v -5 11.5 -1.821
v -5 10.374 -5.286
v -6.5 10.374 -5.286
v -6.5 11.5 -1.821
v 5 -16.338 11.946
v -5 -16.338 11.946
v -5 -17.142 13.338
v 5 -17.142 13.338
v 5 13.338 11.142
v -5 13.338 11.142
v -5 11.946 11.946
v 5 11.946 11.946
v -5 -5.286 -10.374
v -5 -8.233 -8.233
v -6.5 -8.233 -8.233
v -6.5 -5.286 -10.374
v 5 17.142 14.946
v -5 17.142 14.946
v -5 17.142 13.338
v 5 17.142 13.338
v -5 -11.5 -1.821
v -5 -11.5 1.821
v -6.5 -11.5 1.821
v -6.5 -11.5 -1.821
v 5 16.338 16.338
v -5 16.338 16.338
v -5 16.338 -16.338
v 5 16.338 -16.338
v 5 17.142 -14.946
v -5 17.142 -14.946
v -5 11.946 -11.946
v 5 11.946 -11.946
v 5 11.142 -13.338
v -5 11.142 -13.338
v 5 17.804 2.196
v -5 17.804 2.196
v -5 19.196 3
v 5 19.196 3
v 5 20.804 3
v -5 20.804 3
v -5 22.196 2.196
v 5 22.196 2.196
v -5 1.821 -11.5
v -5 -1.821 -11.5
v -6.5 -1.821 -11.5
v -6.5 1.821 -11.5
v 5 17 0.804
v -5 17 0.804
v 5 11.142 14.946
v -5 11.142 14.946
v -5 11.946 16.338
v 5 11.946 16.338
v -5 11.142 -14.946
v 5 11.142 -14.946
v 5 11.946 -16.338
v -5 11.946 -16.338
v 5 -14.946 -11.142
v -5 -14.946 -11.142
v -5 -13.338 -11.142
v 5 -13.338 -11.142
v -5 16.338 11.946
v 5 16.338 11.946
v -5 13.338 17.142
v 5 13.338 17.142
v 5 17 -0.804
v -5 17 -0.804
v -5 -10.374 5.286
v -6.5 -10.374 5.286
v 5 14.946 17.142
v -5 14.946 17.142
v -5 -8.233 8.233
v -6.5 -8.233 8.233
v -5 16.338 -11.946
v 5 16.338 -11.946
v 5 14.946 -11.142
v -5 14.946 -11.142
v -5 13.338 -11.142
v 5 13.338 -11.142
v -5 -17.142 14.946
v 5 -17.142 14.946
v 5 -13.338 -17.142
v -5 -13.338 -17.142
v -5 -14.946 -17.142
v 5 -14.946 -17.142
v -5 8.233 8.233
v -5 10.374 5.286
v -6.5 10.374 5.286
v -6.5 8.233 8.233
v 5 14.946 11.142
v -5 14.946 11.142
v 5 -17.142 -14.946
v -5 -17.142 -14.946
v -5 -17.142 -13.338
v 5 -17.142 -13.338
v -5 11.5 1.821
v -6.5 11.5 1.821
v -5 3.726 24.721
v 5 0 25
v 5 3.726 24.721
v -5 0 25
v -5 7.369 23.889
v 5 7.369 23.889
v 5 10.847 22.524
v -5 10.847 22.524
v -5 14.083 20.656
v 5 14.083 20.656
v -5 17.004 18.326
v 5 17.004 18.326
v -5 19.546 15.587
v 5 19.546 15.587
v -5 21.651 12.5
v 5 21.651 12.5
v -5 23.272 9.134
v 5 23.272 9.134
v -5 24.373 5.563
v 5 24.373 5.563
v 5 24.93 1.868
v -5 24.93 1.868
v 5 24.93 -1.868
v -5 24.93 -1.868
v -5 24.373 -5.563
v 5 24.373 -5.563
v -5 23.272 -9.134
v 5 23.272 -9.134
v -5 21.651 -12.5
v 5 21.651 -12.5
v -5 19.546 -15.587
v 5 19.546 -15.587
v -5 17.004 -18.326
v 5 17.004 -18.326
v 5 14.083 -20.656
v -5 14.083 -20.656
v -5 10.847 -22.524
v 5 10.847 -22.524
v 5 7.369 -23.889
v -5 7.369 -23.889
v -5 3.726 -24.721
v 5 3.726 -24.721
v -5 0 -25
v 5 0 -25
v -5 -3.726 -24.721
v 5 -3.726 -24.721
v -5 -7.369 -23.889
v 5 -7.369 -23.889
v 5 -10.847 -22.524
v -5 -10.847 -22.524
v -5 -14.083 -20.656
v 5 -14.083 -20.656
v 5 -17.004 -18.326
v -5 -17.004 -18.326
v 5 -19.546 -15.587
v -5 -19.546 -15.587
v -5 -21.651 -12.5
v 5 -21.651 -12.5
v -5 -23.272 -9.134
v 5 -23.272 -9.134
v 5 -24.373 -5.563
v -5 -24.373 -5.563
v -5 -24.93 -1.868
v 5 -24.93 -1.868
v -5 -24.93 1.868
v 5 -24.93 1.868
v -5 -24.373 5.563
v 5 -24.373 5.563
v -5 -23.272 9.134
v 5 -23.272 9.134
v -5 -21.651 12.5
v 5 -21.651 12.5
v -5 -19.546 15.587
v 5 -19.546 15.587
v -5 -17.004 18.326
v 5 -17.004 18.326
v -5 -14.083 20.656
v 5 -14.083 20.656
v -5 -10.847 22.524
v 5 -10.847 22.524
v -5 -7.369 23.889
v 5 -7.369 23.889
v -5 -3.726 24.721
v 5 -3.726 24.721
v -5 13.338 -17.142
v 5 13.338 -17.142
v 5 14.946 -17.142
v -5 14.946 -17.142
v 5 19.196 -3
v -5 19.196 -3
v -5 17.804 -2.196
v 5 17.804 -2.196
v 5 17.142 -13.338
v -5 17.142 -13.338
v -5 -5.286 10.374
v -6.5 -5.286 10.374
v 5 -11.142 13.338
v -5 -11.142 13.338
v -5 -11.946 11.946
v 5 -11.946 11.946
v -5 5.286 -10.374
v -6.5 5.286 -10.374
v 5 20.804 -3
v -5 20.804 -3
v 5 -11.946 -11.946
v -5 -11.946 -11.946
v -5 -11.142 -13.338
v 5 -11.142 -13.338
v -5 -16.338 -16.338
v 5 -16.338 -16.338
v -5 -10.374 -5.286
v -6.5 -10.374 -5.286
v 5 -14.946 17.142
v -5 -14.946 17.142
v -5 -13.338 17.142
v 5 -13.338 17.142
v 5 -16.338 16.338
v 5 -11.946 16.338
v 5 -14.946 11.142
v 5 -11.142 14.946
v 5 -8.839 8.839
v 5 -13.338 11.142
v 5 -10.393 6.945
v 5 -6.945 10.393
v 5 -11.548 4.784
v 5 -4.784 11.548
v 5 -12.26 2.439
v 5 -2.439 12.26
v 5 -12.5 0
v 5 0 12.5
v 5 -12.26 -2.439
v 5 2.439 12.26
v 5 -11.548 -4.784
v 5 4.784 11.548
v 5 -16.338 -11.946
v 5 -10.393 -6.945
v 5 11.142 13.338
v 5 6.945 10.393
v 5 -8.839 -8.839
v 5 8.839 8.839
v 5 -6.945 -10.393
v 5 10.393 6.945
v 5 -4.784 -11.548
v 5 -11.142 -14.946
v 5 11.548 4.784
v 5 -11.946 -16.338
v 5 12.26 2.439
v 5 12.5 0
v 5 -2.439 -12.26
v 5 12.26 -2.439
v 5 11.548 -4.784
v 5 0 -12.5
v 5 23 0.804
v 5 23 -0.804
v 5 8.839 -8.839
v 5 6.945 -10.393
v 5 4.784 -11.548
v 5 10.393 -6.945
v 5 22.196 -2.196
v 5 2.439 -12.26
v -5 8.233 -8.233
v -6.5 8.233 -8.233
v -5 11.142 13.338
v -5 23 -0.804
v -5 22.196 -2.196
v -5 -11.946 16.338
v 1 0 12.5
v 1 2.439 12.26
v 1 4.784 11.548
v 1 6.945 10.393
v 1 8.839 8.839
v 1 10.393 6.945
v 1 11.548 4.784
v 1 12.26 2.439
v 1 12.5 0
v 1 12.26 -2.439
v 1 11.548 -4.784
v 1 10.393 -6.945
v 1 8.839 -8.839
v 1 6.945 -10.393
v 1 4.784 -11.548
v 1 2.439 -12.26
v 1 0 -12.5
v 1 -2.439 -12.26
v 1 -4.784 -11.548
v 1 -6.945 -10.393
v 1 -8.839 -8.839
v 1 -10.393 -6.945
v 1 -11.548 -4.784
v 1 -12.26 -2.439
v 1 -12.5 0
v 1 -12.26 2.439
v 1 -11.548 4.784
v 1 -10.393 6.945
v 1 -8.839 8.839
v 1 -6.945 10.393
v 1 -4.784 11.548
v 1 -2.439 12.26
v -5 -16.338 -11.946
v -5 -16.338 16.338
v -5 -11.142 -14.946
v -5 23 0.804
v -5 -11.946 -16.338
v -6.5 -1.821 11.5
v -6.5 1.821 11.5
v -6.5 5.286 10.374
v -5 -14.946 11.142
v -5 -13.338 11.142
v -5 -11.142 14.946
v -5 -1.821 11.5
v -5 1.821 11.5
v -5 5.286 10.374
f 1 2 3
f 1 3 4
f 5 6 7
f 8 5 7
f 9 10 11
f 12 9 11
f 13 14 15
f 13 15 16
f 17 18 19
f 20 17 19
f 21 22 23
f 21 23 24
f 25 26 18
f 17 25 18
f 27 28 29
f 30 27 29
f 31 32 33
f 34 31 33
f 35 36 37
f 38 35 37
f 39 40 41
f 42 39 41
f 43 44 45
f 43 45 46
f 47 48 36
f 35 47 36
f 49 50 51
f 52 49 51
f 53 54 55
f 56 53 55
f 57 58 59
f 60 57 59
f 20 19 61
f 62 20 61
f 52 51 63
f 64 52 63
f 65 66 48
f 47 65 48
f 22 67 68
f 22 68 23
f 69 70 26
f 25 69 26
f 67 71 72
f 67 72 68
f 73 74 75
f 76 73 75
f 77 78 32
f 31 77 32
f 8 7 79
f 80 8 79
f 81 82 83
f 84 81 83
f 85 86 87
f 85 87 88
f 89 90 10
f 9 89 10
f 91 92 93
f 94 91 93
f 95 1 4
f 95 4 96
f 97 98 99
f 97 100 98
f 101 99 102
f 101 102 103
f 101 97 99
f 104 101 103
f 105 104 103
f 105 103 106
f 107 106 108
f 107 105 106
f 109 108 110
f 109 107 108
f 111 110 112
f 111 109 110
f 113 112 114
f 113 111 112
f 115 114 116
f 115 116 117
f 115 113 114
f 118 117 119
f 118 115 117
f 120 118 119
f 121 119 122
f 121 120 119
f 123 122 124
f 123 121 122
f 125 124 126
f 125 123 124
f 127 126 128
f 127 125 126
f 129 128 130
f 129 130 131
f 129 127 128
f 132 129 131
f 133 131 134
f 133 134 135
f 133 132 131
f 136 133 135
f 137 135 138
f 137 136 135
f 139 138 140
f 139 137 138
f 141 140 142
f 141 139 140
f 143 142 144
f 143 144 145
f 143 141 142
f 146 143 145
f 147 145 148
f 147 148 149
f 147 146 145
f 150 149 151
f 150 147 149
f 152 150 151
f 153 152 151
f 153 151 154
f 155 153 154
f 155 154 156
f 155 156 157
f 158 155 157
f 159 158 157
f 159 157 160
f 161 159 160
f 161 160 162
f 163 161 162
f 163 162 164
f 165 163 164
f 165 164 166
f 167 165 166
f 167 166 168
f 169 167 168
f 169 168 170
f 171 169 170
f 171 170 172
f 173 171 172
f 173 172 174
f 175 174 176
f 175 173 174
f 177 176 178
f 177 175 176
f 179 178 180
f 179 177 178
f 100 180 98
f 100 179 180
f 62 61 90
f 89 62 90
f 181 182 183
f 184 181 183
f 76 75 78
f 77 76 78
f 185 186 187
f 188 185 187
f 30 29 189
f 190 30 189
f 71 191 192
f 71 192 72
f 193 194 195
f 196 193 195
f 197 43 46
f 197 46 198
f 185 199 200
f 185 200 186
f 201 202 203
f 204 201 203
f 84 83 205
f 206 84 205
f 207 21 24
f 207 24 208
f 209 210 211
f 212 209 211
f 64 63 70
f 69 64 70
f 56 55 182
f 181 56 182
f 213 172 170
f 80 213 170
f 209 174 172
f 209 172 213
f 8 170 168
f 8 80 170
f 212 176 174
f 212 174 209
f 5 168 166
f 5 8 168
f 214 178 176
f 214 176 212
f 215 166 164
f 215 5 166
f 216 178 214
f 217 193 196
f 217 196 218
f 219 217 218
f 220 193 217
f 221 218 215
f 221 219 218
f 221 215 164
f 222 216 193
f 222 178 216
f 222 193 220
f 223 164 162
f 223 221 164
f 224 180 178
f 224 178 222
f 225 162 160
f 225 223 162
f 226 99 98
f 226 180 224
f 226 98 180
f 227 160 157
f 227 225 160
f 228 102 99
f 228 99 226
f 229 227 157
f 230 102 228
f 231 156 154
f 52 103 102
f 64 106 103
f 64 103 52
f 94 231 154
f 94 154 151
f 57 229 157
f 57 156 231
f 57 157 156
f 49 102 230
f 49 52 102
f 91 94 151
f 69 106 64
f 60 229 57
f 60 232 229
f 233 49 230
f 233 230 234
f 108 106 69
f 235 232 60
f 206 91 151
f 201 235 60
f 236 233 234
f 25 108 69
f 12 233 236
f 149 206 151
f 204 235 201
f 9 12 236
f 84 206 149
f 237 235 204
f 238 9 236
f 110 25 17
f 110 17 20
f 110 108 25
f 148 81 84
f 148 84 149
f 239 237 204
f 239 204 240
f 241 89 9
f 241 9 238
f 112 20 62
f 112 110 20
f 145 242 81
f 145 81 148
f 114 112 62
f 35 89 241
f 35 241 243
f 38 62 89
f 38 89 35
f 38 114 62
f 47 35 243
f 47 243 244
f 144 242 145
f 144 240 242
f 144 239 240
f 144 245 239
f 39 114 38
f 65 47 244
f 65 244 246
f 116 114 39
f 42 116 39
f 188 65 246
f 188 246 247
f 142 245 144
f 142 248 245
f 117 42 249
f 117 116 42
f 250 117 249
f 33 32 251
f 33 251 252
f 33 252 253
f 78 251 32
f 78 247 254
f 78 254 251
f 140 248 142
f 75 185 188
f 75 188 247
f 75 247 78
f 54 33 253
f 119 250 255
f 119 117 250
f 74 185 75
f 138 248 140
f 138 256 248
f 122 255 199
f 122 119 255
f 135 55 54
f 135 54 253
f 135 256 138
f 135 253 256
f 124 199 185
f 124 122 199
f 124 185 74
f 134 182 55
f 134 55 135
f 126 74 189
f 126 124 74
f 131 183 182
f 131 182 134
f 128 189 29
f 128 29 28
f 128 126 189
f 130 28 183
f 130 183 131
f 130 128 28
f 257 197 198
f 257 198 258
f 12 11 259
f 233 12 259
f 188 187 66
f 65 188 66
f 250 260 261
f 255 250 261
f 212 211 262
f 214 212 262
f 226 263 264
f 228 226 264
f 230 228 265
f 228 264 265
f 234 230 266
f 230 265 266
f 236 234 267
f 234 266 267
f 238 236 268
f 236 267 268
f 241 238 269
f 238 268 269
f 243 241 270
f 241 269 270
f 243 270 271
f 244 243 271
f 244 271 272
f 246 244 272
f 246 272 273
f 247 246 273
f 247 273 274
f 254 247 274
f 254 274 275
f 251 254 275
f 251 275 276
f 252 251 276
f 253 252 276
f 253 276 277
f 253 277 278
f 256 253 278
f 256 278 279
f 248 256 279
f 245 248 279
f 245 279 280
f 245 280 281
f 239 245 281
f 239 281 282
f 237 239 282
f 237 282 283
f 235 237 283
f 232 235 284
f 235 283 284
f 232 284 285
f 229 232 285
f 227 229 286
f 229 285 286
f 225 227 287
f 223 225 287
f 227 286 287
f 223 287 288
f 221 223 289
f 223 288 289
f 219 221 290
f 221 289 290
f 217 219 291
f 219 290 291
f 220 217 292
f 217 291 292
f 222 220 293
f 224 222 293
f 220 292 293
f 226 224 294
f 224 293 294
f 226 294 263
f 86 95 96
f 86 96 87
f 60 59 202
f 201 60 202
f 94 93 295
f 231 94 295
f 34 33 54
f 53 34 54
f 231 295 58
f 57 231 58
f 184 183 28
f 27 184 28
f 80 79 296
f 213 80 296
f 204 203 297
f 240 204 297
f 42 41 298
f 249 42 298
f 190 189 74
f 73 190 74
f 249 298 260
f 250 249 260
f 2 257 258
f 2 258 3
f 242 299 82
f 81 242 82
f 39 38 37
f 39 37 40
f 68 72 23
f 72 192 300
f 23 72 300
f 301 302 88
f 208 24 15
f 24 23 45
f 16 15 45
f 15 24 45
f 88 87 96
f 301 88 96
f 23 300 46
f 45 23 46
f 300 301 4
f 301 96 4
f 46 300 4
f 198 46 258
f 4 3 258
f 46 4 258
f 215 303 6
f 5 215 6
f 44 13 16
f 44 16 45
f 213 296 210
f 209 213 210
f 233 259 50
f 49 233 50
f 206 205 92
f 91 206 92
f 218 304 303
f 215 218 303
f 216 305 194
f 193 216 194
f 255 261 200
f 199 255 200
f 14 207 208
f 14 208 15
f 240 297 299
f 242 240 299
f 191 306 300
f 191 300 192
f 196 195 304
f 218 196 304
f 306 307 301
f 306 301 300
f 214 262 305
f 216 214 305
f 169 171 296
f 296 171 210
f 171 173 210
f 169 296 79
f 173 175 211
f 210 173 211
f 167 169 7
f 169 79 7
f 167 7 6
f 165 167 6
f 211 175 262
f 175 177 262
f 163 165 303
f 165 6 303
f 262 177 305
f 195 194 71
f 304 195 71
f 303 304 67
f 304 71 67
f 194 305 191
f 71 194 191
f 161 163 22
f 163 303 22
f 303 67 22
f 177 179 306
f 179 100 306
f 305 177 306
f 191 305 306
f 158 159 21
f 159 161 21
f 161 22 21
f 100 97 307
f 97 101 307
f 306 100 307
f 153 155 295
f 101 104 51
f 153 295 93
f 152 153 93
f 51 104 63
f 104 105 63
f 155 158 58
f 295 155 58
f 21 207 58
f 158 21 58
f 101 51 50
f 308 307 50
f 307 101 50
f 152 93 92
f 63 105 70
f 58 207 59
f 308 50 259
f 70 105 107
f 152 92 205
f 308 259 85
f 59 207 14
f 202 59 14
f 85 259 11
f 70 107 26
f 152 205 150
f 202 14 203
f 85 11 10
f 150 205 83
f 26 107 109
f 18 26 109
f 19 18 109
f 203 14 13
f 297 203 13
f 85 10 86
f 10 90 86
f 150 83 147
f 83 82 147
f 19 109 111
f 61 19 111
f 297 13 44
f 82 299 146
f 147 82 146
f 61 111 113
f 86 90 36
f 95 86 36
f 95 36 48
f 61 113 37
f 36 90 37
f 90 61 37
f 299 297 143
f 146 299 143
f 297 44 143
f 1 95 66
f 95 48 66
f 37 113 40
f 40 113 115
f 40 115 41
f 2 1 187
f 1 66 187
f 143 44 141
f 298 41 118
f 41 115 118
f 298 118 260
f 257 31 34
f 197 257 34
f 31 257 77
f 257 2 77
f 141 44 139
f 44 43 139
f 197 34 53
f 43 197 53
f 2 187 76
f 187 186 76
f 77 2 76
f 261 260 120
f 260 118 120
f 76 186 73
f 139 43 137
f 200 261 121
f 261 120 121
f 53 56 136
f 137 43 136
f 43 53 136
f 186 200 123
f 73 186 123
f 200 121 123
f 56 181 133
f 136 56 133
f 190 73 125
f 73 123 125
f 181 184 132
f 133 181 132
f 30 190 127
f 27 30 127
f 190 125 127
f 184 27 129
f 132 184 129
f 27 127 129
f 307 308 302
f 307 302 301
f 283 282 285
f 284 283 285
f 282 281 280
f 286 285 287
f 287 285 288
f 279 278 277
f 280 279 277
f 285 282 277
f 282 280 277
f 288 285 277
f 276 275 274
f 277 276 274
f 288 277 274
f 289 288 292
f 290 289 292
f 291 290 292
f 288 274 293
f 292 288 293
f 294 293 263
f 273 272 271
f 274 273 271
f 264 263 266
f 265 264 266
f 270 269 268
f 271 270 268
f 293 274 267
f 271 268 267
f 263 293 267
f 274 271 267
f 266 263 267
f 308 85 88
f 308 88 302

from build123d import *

# Parameters (mm, degrees)
SKETCH1_W                      = 10
SKETCH1_H                      = 25
CUT_EXTRUDE1_DEPTH             = 37.742346142
CUT_EXTRUDE2_DEPTH             = 37.742346142
CUT_EXTRUDE3_DEPTH             = 37.742346142
CUT_EXTRUDE4_DEPTH             = 37.742346142
CUT_EXTRUDE5_DEPTH             = 37.742346142
BOSS_EXTRUDE1_DEPTH            = 1.5
F_25_0_25_DIAMETER_HOLE1_D     = 25
F_25_0_25_DIAMETER_HOLE1_DEPTH = 4


with BuildPart() as part:
    # Sketch1 → Revolve1 (revolve)
    with BuildSketch(Plane(origin=(0, 0, 0), x_dir=(-1, 0, 0), z_dir=(0, 0, -1))):
        with Locations((0, 12.5)):
            Rectangle(SKETCH1_W, SKETCH1_H)
    revolve(axis=Axis((5, 0, 0), (-1, 0, 0)))

    # Sketch2 → Cut-Extrude1 (cut, through all)
    with BuildSketch(Plane.ZY.offset(5)):
        Polygon((0.803847577, 17), (2.196152423, 17.803847577), (3, 19.196152423), (3, 20.803847577), (2.196152423, 22.196152423), (0.803847577, 23), (-0.803847577, 23), (-2.196152423, 22.196152423), (-3, 20.803847577), (-3, 19.196152423), (-2.196152423, 17.803847577), (-0.803847577, 17), align=None)
    extrude(amount=-CUT_EXTRUDE1_DEPTH, mode=Mode.SUBTRACT)

    # Sketch3 → Cut-Extrude2 (cut, through all)
    with BuildSketch(Plane.ZY.offset(5)):
        Polygon((-13.338288046, -17.142135624), (-11.945983201, -16.338288046), (-11.142135624, -14.945983201), (-11.142135624, -13.338288046), (-11.945983201, -11.945983201), (-13.338288046, -11.142135624), (-14.945983201, -11.142135624), (-16.338288046, -11.945983201), (-17.142135624, -13.338288046), (-17.142135624, -14.945983201), (-16.338288046, -16.338288046), (-14.945983201, -17.142135624), align=None)
    extrude(amount=-CUT_EXTRUDE2_DEPTH, mode=Mode.SUBTRACT)

    # Sketch4 → Cut-Extrude3 (cut, through all)
    with BuildSketch(Plane.ZY.offset(5)):
        Polygon((14.945983201, -17.142135624), (16.338288046, -16.338288046), (17.142135624, -14.945983201), (17.142135624, -13.338288046), (16.338288046, -11.945983201), (14.945983201, -11.142135624), (13.338288046, -11.142135624), (11.945983201, -11.945983201), (11.142135624, -13.338288046), (11.142135624, -14.945983201), (11.945983201, -16.338288046), (13.338288046, -17.142135624), align=None)
    extrude(amount=-CUT_EXTRUDE3_DEPTH, mode=Mode.SUBTRACT)

    # Sketch5 → Cut-Extrude4 (cut, through all)
    with BuildSketch(Plane.ZY.offset(5)):
        Polygon((16.338288046, 11.945983201), (17.142135624, 13.338288046), (17.142135624, 14.945983201), (16.338288046, 16.338288046), (14.945983201, 17.142135624), (13.338288046, 17.142135624), (11.945983201, 16.338288046), (11.142135624, 14.945983201), (11.142135624, 13.338288046), (11.945983201, 11.945983201), (13.338288046, 11.142135624), (14.945983201, 11.142135624), align=None)
    extrude(amount=-CUT_EXTRUDE4_DEPTH, mode=Mode.SUBTRACT)

    # Sketch6 → Cut-Extrude5 (cut, through all)
    with BuildSketch(Plane(origin=(5, 0, 0), x_dir=(0, 0, -1), z_dir=(1, 0, 0))):
        Polygon((16.338288046, 11.945983201), (17.142135624, 13.338288046), (17.142135624, 14.945983201), (16.338288046, 16.338288046), (14.945983201, 17.142135624), (13.338288046, 17.142135624), (11.945983201, 16.338288046), (11.142135624, 14.945983201), (11.142135624, 13.338288046), (11.945983201, 11.945983201), (13.338288046, 11.142135624), (14.945983201, 11.142135624), align=None)
    extrude(amount=-CUT_EXTRUDE5_DEPTH, mode=Mode.SUBTRACT)

    # Sketch7 → Boss-Extrude1 (add)
    with BuildSketch(Plane.ZY.offset(5)):
        Polygon((8.233090996, -8.233090996), (5.285969807, -10.374299875), (1.821421064, -11.5), (-1.821421064, -11.5), (-5.285969807, -10.374299875), (-8.233090996, -8.233090996), (-10.374299875, -5.285969807), (-11.5, -1.821421064), (-11.5, 1.821421064), (-10.374299875, 5.285969807), (-8.233090996, 8.233090996), (-5.285969807, 10.374299875), (-1.821421064, 11.5), (1.821421064, 11.5), (5.285969807, 10.374299875), (8.233090996, 8.233090996), (10.374299875, 5.285969807), (11.5, 1.821421064), (11.5, -1.821421064), (10.374299875, -5.285969807), align=None)
    extrude(amount=BOSS_EXTRUDE1_DEPTH)

    # Ø25.0 (25) Diameter Hole1
    with Locations(Plane(origin=(5, 0, 0), x_dir=(0, 0, -1), z_dir=(1, 0, 0))):
        with Locations((0, 0)):
            Hole(F_25_0_25_DIAMETER_HOLE1_D / 2, depth=F_25_0_25_DIAMETER_HOLE1_DEPTH)


solid = part.part
